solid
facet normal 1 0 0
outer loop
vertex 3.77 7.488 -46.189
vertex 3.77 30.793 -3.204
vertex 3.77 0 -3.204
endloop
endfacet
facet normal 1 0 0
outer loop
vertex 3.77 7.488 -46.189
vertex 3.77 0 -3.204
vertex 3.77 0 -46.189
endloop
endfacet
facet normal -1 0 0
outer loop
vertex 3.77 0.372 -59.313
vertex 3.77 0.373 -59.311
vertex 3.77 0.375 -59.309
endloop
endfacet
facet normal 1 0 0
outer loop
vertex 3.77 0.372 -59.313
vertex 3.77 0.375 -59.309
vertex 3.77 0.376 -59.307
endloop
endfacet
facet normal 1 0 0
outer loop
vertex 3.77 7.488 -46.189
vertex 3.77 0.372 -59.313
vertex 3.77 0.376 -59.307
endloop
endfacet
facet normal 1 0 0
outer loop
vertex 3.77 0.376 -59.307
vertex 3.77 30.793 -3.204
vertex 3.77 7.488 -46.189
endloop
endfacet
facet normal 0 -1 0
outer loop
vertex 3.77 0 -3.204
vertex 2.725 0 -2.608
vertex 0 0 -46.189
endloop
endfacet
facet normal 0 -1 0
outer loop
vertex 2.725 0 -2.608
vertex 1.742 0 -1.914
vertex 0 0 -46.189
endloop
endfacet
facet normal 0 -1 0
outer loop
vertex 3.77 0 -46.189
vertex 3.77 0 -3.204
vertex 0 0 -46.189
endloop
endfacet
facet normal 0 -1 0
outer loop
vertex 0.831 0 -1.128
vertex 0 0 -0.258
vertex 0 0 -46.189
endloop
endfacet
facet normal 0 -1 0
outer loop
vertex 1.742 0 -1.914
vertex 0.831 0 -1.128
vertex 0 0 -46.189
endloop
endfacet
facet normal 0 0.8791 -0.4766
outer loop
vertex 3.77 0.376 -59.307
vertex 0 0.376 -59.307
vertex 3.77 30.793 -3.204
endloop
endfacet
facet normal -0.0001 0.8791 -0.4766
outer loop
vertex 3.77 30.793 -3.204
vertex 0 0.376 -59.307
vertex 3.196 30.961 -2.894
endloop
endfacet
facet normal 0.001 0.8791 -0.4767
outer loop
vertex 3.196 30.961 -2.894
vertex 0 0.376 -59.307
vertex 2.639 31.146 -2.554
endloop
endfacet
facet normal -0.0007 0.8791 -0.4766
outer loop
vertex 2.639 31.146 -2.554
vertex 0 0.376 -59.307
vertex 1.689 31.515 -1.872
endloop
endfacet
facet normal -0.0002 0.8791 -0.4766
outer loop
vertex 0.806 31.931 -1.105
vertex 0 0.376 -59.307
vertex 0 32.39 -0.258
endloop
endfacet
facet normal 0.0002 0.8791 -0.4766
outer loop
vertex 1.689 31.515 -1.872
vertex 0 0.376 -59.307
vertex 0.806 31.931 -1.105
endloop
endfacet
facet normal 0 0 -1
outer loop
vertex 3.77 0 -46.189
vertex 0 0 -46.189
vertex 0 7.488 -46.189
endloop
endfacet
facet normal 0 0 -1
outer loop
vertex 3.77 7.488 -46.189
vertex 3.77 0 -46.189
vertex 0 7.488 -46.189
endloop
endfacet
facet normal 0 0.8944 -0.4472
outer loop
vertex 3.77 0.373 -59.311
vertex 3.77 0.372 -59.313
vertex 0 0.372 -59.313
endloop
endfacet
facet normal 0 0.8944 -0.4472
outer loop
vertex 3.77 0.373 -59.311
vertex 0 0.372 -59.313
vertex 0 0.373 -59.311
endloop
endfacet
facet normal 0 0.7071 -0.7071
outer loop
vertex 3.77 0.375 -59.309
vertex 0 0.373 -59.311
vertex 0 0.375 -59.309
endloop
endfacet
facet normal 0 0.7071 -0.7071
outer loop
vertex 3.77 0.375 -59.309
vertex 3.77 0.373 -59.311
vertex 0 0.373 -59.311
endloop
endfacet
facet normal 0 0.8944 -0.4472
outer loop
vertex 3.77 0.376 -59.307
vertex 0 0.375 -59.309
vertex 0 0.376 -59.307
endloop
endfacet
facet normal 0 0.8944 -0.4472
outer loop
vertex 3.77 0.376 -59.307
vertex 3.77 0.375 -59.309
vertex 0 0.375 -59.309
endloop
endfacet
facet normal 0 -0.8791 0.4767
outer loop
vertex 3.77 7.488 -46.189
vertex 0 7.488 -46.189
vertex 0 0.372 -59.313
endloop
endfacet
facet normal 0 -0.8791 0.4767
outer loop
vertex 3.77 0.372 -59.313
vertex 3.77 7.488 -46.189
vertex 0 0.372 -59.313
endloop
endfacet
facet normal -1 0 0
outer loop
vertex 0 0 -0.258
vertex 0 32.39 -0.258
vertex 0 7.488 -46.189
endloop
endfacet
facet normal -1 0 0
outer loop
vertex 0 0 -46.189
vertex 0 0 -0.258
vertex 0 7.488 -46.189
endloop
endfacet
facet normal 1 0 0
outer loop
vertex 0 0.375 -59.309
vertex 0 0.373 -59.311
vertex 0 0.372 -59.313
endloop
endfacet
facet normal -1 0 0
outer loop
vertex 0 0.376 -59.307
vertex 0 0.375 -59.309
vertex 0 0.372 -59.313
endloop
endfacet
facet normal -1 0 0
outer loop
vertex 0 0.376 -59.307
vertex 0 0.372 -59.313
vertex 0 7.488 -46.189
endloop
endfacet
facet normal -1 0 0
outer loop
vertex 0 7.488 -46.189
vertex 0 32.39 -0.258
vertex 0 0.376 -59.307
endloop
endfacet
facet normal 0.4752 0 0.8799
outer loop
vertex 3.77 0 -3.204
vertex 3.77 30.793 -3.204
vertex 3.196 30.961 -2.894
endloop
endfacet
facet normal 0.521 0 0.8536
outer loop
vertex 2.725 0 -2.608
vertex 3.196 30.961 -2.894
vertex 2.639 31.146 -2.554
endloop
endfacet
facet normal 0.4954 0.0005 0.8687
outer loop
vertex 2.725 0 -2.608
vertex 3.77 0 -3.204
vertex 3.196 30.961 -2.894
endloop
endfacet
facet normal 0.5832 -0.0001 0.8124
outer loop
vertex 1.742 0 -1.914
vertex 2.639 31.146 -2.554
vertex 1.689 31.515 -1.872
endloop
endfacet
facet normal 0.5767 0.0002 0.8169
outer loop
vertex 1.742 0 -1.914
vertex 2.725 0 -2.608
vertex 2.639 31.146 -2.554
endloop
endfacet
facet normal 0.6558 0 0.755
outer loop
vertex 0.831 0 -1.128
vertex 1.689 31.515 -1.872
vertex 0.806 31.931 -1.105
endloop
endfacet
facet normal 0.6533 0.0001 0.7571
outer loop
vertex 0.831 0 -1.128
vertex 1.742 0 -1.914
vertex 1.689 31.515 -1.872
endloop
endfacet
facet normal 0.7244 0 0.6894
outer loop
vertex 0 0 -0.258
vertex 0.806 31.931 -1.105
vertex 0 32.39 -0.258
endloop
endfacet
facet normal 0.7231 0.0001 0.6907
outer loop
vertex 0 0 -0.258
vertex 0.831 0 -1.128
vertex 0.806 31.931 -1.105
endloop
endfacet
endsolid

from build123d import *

# Parameters (mm, degrees)
BOSS_EXTRUDE1_DEPTH = 3.77
FILLET1_R           = 0.2
CAVITY1_DEPTH       = 32.53
CUT_EXTRUDE1_DEPTH  = 10


# Read off the part's stored shape, not the designer's step: Cavity1
with BuildPart() as part:
    # Sketch1 → Boss-Extrude1 (new body)
    with BuildSketch(Plane(origin=(0, 0, 0), x_dir=(0, 0, -1), z_dir=(1, 0, 0))):
        Polygon((0, 0), (60, 0), (0, 32.53), align=None)
    extrude(amount=BOSS_EXTRUDE1_DEPTH)

    # Fillet1
    fillet1_edges = [part.edges().sort_by_distance(p)[0] for p in [
        (1.885, 0, -60),
    ]]
    fillet(fillet1_edges, radius=FILLET1_R)

    # Cavity1 outline → Cavity1 (cut)
    with BuildSketch(Plane(origin=(0, 0, 0), x_dir=(1, 0, 0), z_dir=(0, 1, 0))):
        with BuildLine():
            Line((3.77, 0), (3.77, 3.2038331))
            ThreePointArc((3.77, 3.2038331), (1.741729711, 1.914090145), (0, 0.257679909))
            Line((0, 0.257679909), (0, 0))
            Line((0, 0), (3.77, 0))
        make_face()
    extrude(amount=CAVITY1_DEPTH, mode=Mode.SUBTRACT)

    # Sketch2 → Cut-Extrude1 (cut)
    with BuildSketch(Plane.ZY):
        Polygon((-46.188988267, 0), (-46.188988267, 7.48784154), (-59.313137704, 0.37224377), (-59.211490846, 0), align=None)
    extrude(amount=-CUT_EXTRUDE1_DEPTH, mode=Mode.SUBTRACT)


with BuildPart() as cut_extrude1_kept_piece:
    # of the separate pieces the step leaves, the one the design keeps (cut_extrude1_pieces_kept)
    add(part.part.solids().sort_by_distance((0, 0, -0.257679909))[0])


solid = cut_extrude1_kept_piece.part
